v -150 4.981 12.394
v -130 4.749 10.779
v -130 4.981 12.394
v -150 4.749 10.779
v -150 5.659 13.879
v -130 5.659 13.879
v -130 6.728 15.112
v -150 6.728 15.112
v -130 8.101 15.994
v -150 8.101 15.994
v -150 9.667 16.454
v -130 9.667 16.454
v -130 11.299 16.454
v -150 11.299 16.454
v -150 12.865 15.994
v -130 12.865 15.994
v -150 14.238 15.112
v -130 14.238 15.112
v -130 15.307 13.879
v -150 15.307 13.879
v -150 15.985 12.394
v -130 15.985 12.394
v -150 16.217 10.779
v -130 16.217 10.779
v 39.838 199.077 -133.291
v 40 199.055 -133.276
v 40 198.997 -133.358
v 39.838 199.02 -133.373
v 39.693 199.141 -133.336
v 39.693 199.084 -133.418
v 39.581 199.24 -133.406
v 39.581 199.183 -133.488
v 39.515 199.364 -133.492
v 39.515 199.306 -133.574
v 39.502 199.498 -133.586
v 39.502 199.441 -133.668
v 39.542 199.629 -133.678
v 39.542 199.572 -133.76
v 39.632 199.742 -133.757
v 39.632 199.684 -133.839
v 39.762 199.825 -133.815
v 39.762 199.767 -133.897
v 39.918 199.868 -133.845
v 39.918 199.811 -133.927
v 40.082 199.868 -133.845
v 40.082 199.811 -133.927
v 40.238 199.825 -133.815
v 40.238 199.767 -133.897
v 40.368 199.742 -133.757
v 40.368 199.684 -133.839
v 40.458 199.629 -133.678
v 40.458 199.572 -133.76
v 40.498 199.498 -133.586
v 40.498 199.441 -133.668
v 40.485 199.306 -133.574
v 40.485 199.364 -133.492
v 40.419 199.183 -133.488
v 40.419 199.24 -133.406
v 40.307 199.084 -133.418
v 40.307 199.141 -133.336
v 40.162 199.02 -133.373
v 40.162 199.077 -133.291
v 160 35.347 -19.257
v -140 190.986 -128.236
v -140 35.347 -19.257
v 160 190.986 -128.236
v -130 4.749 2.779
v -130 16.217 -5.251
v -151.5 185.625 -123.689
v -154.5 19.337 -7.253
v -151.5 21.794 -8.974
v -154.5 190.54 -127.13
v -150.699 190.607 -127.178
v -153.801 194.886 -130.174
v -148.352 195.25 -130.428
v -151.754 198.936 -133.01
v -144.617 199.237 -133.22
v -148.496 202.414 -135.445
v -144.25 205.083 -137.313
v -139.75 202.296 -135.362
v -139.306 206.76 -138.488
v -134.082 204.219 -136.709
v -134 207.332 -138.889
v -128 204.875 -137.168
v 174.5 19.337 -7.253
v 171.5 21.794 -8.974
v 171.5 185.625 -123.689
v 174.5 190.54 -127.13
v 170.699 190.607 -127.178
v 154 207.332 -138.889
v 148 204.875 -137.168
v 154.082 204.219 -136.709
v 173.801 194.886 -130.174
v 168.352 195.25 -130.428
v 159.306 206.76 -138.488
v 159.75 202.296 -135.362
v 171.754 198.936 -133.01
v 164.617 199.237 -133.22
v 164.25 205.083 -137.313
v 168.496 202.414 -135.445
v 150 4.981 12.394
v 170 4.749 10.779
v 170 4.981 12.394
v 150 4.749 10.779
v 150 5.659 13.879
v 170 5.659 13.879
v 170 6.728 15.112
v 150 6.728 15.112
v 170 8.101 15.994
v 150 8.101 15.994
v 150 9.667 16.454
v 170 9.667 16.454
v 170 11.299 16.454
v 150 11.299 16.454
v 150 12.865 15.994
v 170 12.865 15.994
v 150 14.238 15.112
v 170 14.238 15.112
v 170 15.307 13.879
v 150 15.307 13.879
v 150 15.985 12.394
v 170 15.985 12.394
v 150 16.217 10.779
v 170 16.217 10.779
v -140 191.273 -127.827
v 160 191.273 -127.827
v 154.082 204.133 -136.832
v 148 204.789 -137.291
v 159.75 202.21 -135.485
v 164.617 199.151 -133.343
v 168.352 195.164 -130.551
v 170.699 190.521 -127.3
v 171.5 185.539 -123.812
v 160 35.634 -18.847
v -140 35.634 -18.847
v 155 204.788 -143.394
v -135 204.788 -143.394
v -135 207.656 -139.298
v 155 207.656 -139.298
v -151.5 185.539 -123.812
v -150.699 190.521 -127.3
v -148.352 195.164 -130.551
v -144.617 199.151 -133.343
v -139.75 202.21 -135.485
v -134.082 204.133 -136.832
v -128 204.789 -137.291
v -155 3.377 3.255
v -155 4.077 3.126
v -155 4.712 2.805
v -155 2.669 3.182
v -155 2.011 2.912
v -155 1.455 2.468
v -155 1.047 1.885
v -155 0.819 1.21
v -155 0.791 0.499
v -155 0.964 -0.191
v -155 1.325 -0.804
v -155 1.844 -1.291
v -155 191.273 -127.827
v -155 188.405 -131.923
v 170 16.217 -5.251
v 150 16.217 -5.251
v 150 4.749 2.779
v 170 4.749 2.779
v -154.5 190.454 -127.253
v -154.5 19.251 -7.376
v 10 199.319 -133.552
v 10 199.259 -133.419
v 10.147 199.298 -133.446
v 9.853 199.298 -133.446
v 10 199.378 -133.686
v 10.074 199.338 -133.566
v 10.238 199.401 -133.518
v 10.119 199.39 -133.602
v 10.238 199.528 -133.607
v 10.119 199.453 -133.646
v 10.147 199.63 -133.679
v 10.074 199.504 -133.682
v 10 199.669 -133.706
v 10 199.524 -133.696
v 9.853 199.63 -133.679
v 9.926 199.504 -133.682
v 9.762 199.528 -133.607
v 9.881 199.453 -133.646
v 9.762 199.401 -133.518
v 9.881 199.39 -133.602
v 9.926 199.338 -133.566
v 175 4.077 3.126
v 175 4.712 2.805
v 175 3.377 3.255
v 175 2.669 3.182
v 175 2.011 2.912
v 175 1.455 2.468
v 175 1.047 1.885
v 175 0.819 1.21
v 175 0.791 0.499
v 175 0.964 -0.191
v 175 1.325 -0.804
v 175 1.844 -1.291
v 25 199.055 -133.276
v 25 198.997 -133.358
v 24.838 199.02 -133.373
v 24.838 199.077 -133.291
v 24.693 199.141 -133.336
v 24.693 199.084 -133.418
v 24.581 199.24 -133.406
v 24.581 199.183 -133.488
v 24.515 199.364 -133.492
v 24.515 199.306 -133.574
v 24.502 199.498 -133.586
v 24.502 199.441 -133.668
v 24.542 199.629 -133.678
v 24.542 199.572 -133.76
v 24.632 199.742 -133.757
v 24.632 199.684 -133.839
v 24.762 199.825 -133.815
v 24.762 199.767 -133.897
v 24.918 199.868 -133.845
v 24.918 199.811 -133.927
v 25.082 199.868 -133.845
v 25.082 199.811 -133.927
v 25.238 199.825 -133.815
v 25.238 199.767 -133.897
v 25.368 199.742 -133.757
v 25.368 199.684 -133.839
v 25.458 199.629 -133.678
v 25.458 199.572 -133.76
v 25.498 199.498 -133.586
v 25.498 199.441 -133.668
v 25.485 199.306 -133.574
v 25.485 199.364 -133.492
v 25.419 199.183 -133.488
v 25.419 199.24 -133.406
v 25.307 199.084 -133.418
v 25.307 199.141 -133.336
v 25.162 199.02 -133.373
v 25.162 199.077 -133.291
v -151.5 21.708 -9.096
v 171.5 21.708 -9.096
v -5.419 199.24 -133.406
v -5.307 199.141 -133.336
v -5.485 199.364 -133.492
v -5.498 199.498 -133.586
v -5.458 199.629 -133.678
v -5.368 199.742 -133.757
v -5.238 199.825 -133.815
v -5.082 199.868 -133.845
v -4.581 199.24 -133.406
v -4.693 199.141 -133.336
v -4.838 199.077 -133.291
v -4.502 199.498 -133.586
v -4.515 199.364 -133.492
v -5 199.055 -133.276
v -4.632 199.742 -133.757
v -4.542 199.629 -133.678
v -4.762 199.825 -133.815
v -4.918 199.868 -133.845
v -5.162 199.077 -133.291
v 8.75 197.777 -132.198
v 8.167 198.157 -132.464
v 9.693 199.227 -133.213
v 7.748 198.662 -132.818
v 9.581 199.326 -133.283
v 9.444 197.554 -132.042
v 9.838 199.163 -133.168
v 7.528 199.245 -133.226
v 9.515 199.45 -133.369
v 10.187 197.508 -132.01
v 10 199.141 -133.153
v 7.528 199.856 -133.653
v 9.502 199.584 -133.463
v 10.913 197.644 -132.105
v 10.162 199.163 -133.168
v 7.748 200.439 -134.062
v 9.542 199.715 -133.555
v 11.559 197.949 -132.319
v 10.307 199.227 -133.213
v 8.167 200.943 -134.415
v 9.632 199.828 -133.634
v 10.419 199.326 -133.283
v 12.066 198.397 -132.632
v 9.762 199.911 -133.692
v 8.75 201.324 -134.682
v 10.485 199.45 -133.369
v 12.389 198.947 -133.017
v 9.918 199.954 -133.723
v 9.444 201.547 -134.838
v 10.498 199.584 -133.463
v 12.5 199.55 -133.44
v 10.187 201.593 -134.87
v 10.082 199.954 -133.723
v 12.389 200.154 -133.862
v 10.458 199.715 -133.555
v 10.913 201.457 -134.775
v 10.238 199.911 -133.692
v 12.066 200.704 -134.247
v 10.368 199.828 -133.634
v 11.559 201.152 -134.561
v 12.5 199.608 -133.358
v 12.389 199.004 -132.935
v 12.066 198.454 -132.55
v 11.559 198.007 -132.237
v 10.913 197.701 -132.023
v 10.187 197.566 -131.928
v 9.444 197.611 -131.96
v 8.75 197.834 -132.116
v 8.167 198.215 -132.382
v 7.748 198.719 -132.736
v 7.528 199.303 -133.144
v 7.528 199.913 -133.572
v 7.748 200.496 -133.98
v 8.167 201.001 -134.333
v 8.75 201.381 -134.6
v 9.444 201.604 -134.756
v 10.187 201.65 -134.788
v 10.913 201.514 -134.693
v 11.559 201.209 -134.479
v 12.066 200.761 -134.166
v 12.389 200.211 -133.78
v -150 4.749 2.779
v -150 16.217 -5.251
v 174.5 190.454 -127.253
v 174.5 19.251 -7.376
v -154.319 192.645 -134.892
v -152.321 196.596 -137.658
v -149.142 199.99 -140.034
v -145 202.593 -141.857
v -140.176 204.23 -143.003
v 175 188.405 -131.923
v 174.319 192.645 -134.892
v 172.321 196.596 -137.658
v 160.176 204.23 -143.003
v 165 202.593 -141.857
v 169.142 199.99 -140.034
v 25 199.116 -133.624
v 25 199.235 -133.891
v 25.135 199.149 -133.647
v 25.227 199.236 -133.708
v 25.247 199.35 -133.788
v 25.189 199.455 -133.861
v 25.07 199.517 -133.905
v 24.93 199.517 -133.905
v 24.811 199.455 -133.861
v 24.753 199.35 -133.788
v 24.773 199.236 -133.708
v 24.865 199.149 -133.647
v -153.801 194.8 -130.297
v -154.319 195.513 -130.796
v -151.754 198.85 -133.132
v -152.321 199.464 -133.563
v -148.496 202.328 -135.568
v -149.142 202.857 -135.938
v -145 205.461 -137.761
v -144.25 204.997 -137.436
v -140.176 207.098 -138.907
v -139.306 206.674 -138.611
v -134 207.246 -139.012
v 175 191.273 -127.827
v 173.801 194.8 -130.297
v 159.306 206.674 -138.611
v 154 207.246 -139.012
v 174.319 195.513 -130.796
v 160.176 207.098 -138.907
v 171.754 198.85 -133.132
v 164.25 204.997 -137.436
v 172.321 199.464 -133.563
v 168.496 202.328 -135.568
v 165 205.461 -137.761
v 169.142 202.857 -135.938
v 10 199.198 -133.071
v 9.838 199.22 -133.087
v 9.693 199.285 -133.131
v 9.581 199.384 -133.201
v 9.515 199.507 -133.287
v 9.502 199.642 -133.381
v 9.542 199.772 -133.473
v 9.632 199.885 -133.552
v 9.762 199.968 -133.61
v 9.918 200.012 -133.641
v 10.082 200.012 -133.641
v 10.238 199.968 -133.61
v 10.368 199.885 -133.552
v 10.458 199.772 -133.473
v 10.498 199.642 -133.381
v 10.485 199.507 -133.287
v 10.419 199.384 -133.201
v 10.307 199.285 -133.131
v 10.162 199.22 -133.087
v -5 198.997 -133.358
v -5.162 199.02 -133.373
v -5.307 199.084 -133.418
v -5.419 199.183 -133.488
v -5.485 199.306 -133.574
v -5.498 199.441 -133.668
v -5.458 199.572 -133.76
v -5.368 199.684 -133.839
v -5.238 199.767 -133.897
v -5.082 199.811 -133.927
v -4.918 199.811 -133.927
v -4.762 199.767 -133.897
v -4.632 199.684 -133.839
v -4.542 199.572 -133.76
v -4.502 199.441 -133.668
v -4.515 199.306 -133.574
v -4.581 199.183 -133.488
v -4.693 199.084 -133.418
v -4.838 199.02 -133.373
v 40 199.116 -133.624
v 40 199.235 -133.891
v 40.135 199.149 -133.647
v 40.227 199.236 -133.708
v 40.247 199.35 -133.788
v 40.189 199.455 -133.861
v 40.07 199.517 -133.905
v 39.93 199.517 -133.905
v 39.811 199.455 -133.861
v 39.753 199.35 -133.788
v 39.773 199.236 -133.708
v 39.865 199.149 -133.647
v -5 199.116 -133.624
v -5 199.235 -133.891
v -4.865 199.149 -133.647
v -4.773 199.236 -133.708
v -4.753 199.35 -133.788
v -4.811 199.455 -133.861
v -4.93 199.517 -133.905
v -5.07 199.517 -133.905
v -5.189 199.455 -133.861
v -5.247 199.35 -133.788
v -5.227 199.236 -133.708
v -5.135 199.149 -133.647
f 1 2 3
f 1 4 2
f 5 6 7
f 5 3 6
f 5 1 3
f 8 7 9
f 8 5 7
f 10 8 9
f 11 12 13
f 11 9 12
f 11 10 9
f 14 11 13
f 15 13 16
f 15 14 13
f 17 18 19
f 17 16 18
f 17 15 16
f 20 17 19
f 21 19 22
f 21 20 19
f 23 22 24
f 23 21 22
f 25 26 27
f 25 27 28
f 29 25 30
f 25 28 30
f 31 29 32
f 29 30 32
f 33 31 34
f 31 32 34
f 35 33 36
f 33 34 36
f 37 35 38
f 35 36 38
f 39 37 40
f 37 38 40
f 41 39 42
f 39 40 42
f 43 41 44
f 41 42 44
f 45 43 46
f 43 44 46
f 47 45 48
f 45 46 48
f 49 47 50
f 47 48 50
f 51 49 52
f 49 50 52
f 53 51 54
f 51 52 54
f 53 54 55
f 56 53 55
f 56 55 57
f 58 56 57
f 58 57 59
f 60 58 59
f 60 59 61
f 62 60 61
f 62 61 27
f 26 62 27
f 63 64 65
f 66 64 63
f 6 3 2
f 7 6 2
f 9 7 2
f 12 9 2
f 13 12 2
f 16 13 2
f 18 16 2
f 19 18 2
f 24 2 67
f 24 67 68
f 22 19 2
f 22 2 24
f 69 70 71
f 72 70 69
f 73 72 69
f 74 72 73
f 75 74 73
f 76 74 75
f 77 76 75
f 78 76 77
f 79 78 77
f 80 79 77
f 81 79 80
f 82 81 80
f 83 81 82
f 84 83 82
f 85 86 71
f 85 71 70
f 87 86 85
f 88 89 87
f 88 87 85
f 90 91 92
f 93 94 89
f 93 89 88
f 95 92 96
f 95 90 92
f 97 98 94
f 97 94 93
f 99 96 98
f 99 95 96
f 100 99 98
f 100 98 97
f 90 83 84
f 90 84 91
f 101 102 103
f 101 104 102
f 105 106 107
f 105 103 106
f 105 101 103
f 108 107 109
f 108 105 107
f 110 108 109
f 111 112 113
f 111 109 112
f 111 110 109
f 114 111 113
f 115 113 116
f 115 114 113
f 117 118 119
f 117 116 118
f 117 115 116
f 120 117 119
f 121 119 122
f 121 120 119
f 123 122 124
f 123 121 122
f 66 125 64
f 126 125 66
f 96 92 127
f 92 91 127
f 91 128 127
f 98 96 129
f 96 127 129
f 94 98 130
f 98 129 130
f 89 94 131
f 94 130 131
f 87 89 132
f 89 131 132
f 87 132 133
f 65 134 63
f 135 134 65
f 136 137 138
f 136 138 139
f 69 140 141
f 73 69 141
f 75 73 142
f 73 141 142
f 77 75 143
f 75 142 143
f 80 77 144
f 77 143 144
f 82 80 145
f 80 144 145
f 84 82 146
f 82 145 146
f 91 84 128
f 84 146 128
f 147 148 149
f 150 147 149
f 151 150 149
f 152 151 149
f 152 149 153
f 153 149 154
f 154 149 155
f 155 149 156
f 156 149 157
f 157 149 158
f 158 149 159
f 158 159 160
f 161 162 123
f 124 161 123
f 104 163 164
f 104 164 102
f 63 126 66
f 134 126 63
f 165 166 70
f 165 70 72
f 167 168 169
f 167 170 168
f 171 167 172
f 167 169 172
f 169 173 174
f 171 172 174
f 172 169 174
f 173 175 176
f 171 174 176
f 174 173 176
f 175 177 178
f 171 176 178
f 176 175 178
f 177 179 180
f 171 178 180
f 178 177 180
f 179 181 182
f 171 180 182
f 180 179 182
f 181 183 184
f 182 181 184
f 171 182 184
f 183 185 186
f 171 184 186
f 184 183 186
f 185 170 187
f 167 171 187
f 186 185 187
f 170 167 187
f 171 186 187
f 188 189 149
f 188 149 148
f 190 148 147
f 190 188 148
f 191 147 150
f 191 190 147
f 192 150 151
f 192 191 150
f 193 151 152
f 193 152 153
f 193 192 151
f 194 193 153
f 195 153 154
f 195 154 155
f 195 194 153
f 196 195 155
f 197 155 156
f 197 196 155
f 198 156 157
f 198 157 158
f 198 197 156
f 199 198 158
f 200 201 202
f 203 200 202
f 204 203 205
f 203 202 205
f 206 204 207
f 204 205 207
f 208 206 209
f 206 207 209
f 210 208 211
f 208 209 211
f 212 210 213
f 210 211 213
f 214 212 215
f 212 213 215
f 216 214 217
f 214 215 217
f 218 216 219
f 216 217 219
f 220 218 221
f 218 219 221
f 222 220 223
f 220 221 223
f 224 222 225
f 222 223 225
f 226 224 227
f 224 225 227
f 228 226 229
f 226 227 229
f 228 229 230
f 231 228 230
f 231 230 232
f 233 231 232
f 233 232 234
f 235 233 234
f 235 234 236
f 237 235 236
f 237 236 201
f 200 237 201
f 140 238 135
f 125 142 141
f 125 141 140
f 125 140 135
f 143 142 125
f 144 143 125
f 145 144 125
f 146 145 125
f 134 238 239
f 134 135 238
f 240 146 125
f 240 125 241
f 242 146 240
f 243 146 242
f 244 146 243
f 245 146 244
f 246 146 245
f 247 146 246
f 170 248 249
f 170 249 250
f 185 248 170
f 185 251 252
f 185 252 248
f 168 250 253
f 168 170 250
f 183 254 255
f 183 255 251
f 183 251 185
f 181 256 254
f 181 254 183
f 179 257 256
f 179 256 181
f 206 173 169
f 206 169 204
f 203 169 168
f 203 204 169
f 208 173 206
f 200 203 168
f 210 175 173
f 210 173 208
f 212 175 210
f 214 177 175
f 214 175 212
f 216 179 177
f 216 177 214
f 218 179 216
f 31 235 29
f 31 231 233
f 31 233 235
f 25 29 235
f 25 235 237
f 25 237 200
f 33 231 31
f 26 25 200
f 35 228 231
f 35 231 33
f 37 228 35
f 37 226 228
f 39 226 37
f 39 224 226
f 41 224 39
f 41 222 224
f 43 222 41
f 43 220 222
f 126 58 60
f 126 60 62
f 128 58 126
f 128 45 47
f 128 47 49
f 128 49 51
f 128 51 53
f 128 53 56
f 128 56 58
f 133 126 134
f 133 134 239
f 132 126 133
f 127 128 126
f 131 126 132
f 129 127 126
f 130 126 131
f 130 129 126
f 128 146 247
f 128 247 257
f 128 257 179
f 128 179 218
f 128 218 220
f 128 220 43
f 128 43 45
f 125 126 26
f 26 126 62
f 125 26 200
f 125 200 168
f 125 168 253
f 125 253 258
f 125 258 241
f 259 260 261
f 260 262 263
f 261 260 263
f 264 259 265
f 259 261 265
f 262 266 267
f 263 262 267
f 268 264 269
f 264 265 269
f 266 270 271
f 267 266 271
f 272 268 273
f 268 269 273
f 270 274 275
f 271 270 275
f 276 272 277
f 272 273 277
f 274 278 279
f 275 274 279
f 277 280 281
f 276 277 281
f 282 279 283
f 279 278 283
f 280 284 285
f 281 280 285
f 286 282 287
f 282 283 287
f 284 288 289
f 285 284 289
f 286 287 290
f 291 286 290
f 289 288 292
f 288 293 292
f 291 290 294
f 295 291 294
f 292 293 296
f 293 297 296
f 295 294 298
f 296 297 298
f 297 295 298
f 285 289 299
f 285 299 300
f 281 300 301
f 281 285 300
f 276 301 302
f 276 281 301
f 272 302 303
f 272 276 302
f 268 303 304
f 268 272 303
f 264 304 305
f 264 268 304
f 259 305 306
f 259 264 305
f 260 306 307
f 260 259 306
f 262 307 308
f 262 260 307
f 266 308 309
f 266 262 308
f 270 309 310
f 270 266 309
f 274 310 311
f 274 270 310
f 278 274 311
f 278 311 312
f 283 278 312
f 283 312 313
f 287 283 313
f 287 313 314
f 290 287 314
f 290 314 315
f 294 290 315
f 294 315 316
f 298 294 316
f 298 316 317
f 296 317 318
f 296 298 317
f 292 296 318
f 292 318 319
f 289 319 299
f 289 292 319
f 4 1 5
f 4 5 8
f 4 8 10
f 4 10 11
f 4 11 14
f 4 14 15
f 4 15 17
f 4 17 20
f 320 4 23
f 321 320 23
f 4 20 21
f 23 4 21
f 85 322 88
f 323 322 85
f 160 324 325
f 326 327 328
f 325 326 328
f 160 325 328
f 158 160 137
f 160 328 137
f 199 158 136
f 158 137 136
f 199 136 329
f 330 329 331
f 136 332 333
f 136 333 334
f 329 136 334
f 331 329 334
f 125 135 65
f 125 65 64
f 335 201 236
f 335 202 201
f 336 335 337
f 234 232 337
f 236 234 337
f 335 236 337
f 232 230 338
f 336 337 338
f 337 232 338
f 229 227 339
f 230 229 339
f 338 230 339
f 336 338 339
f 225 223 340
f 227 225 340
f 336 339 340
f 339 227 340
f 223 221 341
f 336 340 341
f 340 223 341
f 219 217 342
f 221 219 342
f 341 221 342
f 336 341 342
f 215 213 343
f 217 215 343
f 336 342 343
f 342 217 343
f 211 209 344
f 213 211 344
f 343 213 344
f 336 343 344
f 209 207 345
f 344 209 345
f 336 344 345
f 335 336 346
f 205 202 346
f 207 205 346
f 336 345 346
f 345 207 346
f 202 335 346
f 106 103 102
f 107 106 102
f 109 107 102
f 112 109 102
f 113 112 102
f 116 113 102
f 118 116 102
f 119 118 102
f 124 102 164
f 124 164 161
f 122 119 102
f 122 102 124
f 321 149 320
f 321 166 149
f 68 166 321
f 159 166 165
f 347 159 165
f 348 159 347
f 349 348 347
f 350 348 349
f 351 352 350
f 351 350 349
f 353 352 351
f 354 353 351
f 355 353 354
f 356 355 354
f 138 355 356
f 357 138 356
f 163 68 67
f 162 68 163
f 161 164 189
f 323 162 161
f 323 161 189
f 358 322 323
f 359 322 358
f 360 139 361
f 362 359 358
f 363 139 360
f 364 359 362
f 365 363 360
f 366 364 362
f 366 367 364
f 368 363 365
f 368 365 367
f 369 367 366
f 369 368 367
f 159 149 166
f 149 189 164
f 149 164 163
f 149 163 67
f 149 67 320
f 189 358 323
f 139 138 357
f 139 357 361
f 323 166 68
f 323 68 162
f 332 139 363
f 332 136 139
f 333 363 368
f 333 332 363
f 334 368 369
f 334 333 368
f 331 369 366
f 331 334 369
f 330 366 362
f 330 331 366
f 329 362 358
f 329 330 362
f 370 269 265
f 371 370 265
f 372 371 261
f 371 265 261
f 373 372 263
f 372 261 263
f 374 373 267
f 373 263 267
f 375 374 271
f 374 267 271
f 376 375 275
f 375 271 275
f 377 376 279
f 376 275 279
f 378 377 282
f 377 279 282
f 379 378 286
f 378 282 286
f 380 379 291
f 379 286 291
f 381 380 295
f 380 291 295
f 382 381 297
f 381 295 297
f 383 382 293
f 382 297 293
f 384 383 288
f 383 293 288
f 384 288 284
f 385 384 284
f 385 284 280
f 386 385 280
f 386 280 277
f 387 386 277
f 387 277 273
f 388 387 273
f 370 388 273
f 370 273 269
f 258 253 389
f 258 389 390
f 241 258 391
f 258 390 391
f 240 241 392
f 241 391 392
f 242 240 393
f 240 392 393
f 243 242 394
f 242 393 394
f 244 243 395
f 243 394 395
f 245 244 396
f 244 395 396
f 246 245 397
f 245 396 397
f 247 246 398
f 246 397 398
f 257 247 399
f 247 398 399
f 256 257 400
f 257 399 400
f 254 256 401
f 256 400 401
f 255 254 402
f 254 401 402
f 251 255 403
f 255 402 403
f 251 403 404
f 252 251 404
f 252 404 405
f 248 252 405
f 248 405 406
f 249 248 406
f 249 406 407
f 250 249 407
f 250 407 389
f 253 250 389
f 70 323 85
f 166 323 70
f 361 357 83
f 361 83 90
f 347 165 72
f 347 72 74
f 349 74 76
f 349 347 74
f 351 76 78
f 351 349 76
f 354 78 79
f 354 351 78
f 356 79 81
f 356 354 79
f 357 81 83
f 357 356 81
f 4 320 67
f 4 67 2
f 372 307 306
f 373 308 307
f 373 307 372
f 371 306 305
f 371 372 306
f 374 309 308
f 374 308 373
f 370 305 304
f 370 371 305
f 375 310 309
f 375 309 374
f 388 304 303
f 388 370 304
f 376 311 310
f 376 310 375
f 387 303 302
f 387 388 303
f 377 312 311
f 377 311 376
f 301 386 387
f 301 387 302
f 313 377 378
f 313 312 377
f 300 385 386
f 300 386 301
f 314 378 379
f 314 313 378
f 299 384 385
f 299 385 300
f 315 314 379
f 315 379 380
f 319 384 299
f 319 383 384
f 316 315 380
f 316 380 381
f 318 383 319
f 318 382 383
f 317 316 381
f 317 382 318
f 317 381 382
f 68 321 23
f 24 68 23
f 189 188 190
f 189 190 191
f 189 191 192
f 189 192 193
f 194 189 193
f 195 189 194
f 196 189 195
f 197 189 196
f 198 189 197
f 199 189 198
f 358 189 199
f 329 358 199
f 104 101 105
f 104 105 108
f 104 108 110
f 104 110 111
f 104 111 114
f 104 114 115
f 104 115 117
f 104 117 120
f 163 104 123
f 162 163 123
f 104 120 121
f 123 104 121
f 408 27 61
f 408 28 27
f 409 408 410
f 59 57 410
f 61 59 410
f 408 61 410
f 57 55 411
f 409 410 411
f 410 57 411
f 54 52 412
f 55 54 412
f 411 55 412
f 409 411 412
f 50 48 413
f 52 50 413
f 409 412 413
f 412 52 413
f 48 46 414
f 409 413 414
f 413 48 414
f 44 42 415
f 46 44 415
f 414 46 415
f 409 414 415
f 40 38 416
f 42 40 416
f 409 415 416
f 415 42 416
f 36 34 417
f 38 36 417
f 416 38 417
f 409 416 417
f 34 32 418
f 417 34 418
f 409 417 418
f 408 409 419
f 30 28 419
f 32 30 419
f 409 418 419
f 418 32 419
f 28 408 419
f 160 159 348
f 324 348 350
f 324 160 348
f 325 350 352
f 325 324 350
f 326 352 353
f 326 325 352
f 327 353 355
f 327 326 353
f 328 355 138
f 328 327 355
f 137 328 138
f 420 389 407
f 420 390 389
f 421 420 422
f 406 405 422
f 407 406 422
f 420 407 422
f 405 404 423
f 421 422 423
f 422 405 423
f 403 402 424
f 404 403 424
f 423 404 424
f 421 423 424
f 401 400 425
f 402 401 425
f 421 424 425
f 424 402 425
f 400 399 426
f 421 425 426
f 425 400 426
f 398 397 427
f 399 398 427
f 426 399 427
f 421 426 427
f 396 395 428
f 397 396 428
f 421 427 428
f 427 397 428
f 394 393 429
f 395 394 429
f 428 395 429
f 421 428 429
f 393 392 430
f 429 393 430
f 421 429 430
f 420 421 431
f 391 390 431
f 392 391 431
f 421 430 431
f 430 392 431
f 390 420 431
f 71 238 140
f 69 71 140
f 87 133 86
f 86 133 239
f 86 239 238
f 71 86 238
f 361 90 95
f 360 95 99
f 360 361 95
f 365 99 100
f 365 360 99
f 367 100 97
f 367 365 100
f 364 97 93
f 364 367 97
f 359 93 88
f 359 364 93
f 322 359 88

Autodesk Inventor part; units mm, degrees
ref_plane "XZ Plane" through (0, 0, 0) normal (0, 1, 0) x (-1, 0, 0)
ref_plane "XY Plane" through (0, 0, 0) normal (0, 0, 1) x (1, 0, 0)
sketch "Sketch1" plane through (0, 0, 0) normal (0, 0, 1) x (1, 0, 0)
  line L0 (-145, 250) -> (145, 250)
  line L1 (165, 230) -> (165, 0)
  line L2 (165, 0) -> (-165, 0)
  line L3 (-165, 0) -> (-165, 230)
  arc A0 (-145, 250) -> (-165, 230) centre (-145, 230) ccw
  arc A1 (165, 230) -> (145, 250) centre (145, 230) ccw
  point P0 (0, 0)
  point P1 (165, 250)
  dimension "d2" = 330
  dimension "d3" = 250
  dimension "d4" = 20
extrude "MONITOR" add sketch "Sketch1" along normal blind 5
sketch "Sketch2" plane through (0, 0, 5) normal (0, 0, 1) x (1, 0, 0)
  line L0 (150, 40) -> (-150, 40)
  line L1 (-150, 40) -> (-150, 230)
  line L2 (-150, 230) -> (150, 230)
  line L3 (150, 230) -> (150, 40)
  dimension "d9" = 300
  dimension "d10" = 190
extrude "SCREEN" cut sketch "Sketch2" against normal blind 0.5
sketch "Sketch3" plane through (0, 0, 5) normal (0, 0, 1) x (1, 0, 0)
  circle A0 centre (0, 240) radius 2.5
  point P0 (0, 0)
sketch "Sketch4" plane through (0, 240, 5.25) normal (0, 0, 1) x (1, 0, 0)
  point P0 (0, -240)
  point P1 (0, 0)
extrude "CAMERA" add sketch "Sketch3" along normal blind 0.25
extrude "CAMERA" add sketch "Sketch3" along normal blind 0.25
hole "CAMERA " at (0, 240, 5.25) direction (0, 0, -1) diameter 1 depth 0.1 tip angle 118
sketch "Sketch5" plane through (0, 0, 5) normal (0, 0, 1) x (1, 0, 0)
  point P0 (0, 0)
  point P1 (15, 240)
  point P2 (30, 240)
  point P3 (-15, 240)
hole "AESTHETICS" at (15, 240, 5) at (30, 240, 5) at (-15, 240, 5) direction (0, 0, -1) diameter 1 depth 0.1 tip angle 118
sketch "Sketch6" plane through (0, 0, 5) normal (0, 0, 1) x (1, 0, 0)
  line L0 (164.5, 20) -> (-164.5, 20)
  line L1 (-164.5, 20) -> (-164.5, 229)
  line L2 (-144, 249.5) -> (144, 249.5)
  line L3 (164.5, 229) -> (164.5, 20)
  arc A0 (-144, 249.5) -> (-164.5, 229) centre (-144, 229) ccw
  arc A1 (164.5, 229) -> (144, 249.5) centre (144, 229) ccw
  point P0 (-164.5, 249.5)
  point P1 (164.5, 249.5)
  dimension "d36" = 229.5
  dimension "d37" = 20.5
  dimension "d38" = 329
extrude "SIDE BAND" add sketch "Sketch6" along normal blind 0.15
sketch "Sketch7" plane through (0, 0, 5) normal (0, 0, 1) x (1, 0, 0)
  line L0 (161.5, 23) -> (-161.5, 23)
  line L1 (-161.5, 23) -> (-161.5, 223)
  line L2 (-138, 246.5) -> (138, 246.5)
  line L3 (161.5, 223) -> (161.5, 23)
  arc A0 (-138, 246.5) -> (-161.5, 223) centre (-138, 223) ccw
  arc A1 (161.5, 223) -> (138, 246.5) centre (138, 223) ccw
  point P0 (-161.5, 246.5)
  point P1 (161.5, 246.5)
  dimension "d47" = 323
  dimension "d48" = 223.5
  dimension "d49" = 23.5
extrude "SIDE BAND 1" cut sketch "Sketch7" along normal blind 0.15
sketch "Sketch8" plane through (165, 0, 0) normal (1, 0, 0) x (0, 0, -1)
  line L0 (0, 0) -> (-5, 0)
  line L1 (-5, 0) -> (-5, 2.251)
  line L2 (-5, 2.251) -> (0, 2.251)
  line L3 (0, 2.251) -> (0, 0)
extrude "CUT" cut sketch "Sketch8" against normal blind 330
sketch "Sketch9" plane through (165, 230, 5) normal (1, 0, 0) x (0, 0, -1)
  arc A0 (0, -227.749) -> (5, -227.749) centre (2.5, -227.749) ccw
  line L0 (0, -227.749) -> (5, -227.749)
extrude "ROUND BASE" add sketch "Sketch9" against normal blind 330
ref_plane "Work Plane1" through (150, 0, 0) normal (1, 0, 0) x (0, 1, 0)
sketch "Sketch10" plane through (150, 0, 0) normal (1, 0, 0) x (0, 1, 0)
  line L0 (2.2964, 5) -> (-2.2922, 11.5532)
  line L1 (2.2964, 5) -> (10.2964, 5) construction
  line L2 (2.2964, 5) -> (16.2964, 5)
  line L3 (16.2964, 5) -> (7.102, 18.1311)
  arc A0 (7.102, 18.1311) -> (-2.2922, 11.5532) centre (2.4049, 14.8421) ccw
  dimension "d58" = 8
  dimension "d60" = 14
  dimension "d62" = 16.0301
  dimension "d63" = 5.7341
extrude "HINGE" add sketch "Sketch10" along normal mid plane 20
pattern_linear "HINGE 1" count 2 spacing 300 along (-1, 0, 0) of "HINGE"
move or copy body "Move Body1" bodies to move or copy 1 copy no rotation origin (0, 0, 0) rotation axis (1, 0, 0) rotation angle -35
move or copy body "Move Body2" bodies to move or copy 1 copy no translate (10, 0, 0)
properties part number "MONITOR"
